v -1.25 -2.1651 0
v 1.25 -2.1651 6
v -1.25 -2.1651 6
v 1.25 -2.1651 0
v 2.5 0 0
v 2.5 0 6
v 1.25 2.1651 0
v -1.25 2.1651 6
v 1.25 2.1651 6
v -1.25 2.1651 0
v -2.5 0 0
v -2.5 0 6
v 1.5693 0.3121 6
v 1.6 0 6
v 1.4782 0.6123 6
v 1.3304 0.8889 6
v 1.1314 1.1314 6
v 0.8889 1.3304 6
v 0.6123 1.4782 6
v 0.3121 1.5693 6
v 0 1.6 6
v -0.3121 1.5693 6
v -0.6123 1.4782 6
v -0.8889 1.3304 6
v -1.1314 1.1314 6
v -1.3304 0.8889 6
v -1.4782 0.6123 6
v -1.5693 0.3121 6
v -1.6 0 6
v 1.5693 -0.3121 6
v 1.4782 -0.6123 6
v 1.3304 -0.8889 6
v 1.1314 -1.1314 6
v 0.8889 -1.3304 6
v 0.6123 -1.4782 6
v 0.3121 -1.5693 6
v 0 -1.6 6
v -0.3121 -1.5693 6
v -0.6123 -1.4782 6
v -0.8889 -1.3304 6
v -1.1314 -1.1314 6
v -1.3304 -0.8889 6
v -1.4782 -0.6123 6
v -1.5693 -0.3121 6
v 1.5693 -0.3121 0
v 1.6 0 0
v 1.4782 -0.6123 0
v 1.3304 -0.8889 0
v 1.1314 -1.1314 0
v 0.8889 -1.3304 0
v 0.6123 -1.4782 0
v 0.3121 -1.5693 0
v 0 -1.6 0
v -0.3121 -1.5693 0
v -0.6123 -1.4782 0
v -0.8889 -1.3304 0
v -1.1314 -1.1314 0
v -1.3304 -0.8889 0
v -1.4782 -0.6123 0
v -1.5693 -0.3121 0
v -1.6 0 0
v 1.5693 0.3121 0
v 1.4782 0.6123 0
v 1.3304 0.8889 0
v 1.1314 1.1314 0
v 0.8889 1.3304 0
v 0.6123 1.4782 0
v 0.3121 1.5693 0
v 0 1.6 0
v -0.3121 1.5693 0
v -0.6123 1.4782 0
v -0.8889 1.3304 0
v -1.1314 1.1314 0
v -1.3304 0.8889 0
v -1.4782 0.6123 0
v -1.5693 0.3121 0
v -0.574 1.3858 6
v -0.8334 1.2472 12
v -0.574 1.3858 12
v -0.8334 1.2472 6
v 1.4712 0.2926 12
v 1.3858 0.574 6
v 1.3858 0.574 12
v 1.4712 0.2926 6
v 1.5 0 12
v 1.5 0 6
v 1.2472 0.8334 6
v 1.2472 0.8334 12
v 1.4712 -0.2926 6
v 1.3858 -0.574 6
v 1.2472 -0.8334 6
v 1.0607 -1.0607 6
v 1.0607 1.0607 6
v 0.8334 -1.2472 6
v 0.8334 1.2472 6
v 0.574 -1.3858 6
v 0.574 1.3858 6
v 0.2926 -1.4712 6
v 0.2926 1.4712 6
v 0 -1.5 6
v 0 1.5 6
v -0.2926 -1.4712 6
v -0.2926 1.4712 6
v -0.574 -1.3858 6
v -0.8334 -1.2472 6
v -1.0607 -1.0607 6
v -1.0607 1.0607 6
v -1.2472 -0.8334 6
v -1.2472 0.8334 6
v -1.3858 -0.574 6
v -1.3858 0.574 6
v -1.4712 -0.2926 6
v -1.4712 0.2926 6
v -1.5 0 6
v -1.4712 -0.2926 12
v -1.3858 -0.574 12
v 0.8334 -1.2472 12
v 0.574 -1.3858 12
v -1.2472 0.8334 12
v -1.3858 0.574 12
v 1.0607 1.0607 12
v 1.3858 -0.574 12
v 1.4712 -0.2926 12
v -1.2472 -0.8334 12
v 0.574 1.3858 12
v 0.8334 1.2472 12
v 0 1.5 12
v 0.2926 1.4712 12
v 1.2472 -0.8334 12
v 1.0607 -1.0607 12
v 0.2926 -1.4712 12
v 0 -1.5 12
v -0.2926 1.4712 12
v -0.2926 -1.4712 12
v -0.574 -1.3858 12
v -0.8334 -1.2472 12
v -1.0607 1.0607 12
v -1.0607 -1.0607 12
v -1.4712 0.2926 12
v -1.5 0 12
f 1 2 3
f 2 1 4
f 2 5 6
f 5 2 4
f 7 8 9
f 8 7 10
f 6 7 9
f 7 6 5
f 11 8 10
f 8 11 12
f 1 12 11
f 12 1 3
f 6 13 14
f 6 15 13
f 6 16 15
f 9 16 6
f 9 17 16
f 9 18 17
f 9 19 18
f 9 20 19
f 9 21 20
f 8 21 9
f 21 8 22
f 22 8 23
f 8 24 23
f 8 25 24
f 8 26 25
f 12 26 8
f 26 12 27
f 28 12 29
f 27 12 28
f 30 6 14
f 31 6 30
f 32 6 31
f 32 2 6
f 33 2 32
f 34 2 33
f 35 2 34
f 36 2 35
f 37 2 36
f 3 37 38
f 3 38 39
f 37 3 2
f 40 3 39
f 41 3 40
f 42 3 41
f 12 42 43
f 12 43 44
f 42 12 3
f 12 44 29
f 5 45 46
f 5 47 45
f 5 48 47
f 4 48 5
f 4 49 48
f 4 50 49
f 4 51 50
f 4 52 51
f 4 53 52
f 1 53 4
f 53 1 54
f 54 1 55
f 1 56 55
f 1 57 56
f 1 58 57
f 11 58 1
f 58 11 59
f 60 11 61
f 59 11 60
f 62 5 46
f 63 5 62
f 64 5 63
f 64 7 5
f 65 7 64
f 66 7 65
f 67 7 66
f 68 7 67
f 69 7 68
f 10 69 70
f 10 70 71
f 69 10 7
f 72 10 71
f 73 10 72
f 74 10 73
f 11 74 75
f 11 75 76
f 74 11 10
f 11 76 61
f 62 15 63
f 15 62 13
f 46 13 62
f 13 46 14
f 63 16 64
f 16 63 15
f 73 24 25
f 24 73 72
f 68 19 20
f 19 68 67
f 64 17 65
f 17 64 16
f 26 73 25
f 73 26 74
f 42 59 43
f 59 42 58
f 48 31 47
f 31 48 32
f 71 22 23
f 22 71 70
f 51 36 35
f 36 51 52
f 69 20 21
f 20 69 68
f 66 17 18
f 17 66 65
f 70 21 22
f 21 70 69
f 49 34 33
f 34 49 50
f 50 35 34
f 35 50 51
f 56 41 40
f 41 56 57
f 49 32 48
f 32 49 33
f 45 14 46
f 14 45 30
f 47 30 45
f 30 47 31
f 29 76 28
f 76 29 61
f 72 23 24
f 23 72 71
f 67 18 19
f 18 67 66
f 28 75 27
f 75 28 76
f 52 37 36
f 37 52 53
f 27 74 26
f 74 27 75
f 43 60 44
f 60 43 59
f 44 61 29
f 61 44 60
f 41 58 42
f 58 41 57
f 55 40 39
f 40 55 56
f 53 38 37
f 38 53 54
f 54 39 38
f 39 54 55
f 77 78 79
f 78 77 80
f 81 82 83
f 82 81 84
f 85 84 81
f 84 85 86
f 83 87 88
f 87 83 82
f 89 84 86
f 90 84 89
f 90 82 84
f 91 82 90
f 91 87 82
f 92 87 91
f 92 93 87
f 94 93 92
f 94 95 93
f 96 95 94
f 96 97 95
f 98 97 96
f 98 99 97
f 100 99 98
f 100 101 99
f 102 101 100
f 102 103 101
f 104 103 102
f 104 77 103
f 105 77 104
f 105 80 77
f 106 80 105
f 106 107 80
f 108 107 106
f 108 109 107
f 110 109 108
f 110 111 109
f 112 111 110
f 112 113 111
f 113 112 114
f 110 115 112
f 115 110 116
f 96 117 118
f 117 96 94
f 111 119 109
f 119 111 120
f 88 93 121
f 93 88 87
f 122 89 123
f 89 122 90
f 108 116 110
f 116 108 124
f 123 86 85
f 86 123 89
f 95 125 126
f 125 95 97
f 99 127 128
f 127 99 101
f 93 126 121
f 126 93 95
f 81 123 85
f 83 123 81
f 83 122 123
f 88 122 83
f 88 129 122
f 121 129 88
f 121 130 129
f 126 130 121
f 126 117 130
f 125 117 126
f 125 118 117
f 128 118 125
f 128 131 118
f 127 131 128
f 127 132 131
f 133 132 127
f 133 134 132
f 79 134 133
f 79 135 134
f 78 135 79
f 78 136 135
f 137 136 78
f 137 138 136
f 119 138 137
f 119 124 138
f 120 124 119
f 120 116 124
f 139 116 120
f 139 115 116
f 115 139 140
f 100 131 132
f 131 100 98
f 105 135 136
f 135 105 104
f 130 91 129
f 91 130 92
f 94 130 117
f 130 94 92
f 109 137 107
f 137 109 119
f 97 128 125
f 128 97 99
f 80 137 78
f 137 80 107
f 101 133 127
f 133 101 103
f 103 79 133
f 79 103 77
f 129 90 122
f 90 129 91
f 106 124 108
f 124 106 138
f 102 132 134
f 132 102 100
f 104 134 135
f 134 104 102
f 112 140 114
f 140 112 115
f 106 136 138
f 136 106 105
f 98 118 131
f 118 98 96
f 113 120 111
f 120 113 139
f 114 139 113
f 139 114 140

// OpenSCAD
// file: ../dimensions.scad
// Shared dimensions for all case components
// This file defines common parameters used across multiple case parts

// --- Wall and Material ---
wall_thickness = 3;

// --- Motherboard (Mini-ITX) ---
mobo_width = 170;
mobo_depth = 170;
mobo_pcb_thickness = 1.6;

// --- Standoffs ---
standoff_height = 6;  // Female thread portion of M3x10+6mm male-female standoff
standoff_hole_radius = 1.6;  // M3 clearance (deprecated - see integrated bottom panel design)
standoff_locations = [
    [12.7, 12.7],
    [165.1, 12.7],
    [12.7, 165.1],
    [165.1, 165.1]
];

// --- Standoff Hexagonal Receptacles (Integrated Bottom Panel Design) ---
standoff_boss_height = 2.5;              // Height of hex boss above panel interior surface
standoff_hex_size_flat_to_flat = 5.5;   // Hex size for M3 screw head (flat-to-flat)
standoff_hex_size_point_to_point = 6.35; // Hex size point-to-point (calculated from F-F)
standoff_pocket_depth = 2.2;             // Depth of hex recess for screw head
standoff_boss_diameter = 6.85;           // Overall boss diameter (hex point + FDM tolerance)
standoff_mounting_screw_length = 8;      // M3 x 8mm cap screw (recommended)
standoff_screw_clearance_hole = 3.3;     // M3 clearance hole + FDM tolerance

// --- I/O Shield ---
// Standard ATX I/O shield dimensions
io_shield_width = 158.75;   // 6.25 inches (standard ATX)
io_shield_height = 44.45;   // 1.75 inches (standard ATX)
io_shield_x_offset = (mobo_width - io_shield_width) / 2;
io_shield_z_offset = 5;     // 5mm from bottom of plate

// --- Backplate ---
backplate_height = 88.9;    // 3.5 inches
backplate_thickness = wall_thickness;

// --- CPU Cooler (Noctua NH-L12S) - Minimal/NAS configurations ---
cooler_width = 128;
cooler_depth = 146;
cooler_base_height = 35;      // Base plate and heatpipes
cooler_fan_height = 15;       // 120mm x 15mm fan (NF-A12x15)
cooler_fins_height = 20;      // Heatsink fins on top
cooler_total_height = cooler_base_height + cooler_fan_height + cooler_fins_height;  // 70mm

// --- CPU Cooler (Noctua NH-L9) - Pico configuration ---
cooler_nh_l9_width = 95;
cooler_nh_l9_depth = 95;
cooler_nh_l9_base_height = 5;       // CPU contact base
cooler_nh_l9_heatsink_height = 18;  // Aluminum fins
cooler_nh_l9_fan_height = 14;       // 92mm x 14mm fan
cooler_nh_l9_total_height = cooler_nh_l9_base_height + cooler_nh_l9_heatsink_height + cooler_nh_l9_fan_height;  // 37mm

// --- Power Supplies ---
// Flex ATX (from technical drawing)
// Standing orientation: 40mm wide (X), 150mm deep (Y), 80mm tall (Z)
flex_atx_width = 40.0;      // A: Width (X - thin side, standing)
flex_atx_length = 150.0;    // B: Length (Y - depth)
flex_atx_height = 80.0;     // G: Height (Z - tall side, standing)

// Flex ATX Mounting holes - 8-32 UNC thread (4 places on rear 40x80mm face)
flex_atx_mount_hole_radius = 2.1;   // 8-32 clearance (~4.2mm dia)
flex_atx_mount_x_inset = 5;         // Distance from left/right edges (corrected from 12.5)
flex_atx_mount_z_inset = 5;         // Distance from top/bottom edges (corrected from 8.25)

// Calculated mounting hole positions (X, Z pairs relative to PSU origin)
// Note: Only 3 holes - top-right (coords) removed where C14 inlet is located
// When viewing from back: top-right (coords) = top-left (view)
flex_atx_mount_holes = [
    [flex_atx_mount_x_inset, flex_atx_mount_z_inset],                                    // Bottom-left (coords) = Bottom-right (view)
    [flex_atx_width - flex_atx_mount_x_inset, flex_atx_mount_z_inset],                   // Bottom-right (coords) = Bottom-left (view)
    [flex_atx_mount_x_inset, flex_atx_height - flex_atx_mount_z_inset]                   // Top-left (coords) = Top-right (view)
    // Top-right (coords) removed - C14 power inlet is here = Top-left (view)
];

// SFX
sfx_length = 125;
sfx_width = 100;
sfx_height = 63.5;

// --- HDD 3.5" Dimensions ---
hdd_width = 101.6;
hdd_length = 147;
hdd_height = 26.1;

// --- NAS 2-Disk Config ---
// 2 HDDs side-by-side (controlling dimension for case width)
// See SPEC.md Section 3.3 for design rationale
nas_2disk_rail_width = 2;
nas_2disk_gap = 5;           // Gap between bays
nas_2disk_padding = 2;       // Clearance around HDDs
nas_2disk_bay_width = hdd_width + 2 * nas_2disk_rail_width;  // ~105.6mm per bay
nas_2disk_inner_width = 2 * nas_2disk_bay_width + nas_2disk_gap;  // ~216.2mm
nas_2disk_width = nas_2disk_inner_width + 2 * (wall_thickness + nas_2disk_padding);  // ~226mm

// --- PSU Compartment ---
// Flex ATX PSU in standing orientation (40mm width)
flex_atx_standing_width = flex_atx_width;  // 40mm (already in standing orientation)
psu_compartment_width = nas_2disk_width - mobo_width;  // ~56mm (40mm PSU + 16mm clearance)

// --- Interior Chamber Height (standoffs + motherboard + cooler) ---
interior_chamber_height = standoff_height + mobo_pcb_thickness + cooler_total_height;  // ~94mm

// --- Minimal Config External Dimensions ---
// Motherboard area only (without PSU)
minimal_mobo_exterior_width = mobo_width + 2 * wall_thickness;   // 176mm
minimal_mobo_exterior_depth = mobo_depth + 2 * wall_thickness;   // 176mm
minimal_exterior_height = interior_chamber_height + 2 * wall_thickness;   // ~100mm

// With Flex ATX PSU next to motherboard
// Width controlled by NAS 2-disk HDD layout (see SPEC.md Section 3.3)
minimal_with_psu_width = nas_2disk_width;  // ~226mm (PSU compartment = 56mm, PSU on side = 40mm)

// --- Interior Panel Dimensions (top/bottom panels fit between walls) ---
interior_panel_width = minimal_with_psu_width - 2 * wall_thickness;  // ~220mm
interior_panel_depth = mobo_depth;                                    // 170mm

// --- Side Panel Dimensions (left/right panels form exterior walls) ---
side_panel_height = minimal_exterior_height;                          // ~100mm
side_panel_depth = mobo_depth + 2 * wall_thickness;                   // 176mm

// --- Front/Back Panel Dimensions (fit between side walls, full exterior height) ---
front_back_panel_width = interior_panel_width;                        // ~220mm
front_back_panel_height = side_panel_height;                          // ~100mm (full exterior)

// --- Ventilation ---
honeycomb_radius = 3;
vent_padding = 5;

// --- Screw Holes for Panel Assembly ---
panel_screw_radius = 1.6;  // M3
panel_screw_inset = 8;     // Distance from edge

// --- GPU ---
gpu_length = 320;          // Max GPU length
gpu_height = 140;          // GPU PCB + cooler height
gpu_width = 60;            // 3 slots

// --- GPU Config External Dimensions ---
// From SPEC.md Section 8.4
gpu_config_width = 171;    // mm
gpu_config_depth = 378;    // mm
gpu_config_height = 190;   // mm

// --- Fans ---
fan_120_size = 120;
fan_120_thickness = 25;
fan_140_size = 140;
fan_140_thickness = 25;

// --- AIO Radiator ---
radiator_240_length = 275;
radiator_240_width = 120;
radiator_240_thickness = 27;

// --- NAS Many-Disk Config ---
// 5-8 drives mounted vertically (on narrowest side)
nas_many_drive_count = 6;  // Default 6 drives
nas_many_drive_spacing = 5;
nas_many_enclosure_height = hdd_width + wall_thickness + 5;  // ~110mm (drives on side)

// --- Power Inlet C14 ---
c14_width = 50;
c14_height = 27;
c14_depth = 30;

// --- Open Air Frame ---
// Frame cylinder height (from motherboard surface to inside panel face)
// Derived: interior_chamber_height - standoff_height - mobo_pcb_thickness
frame_cylinder_height = interior_chamber_height - standoff_height - mobo_pcb_thickness;  // ~86mm
frame_cylinder_outer_diameter = 8;     // Outer diameter
frame_cylinder_inner_diameter = 3.2;   // M3 clearance for standoff stud
frame_cylinder_thread_depth = 6;       // Matches extended_standoff_male_height (M3x6+6mm)
// main file
// Extended Standoff - M3x6+6mm Male-Female
// Used for Open Air Frame mounting system
// 6mm female thread below (accepts motherboard mounting screw)
// 6mm male stud above (frame cylinders screw onto this)

include <../dimensions.scad>

// --- Extended Standoff Dimensions ---
extended_standoff_female_height = 6;      // Female portion height (below mobo)
extended_standoff_male_height = 6;        // Male stud height (above mobo)
extended_standoff_outer_diameter = 5;     // Outer diameter of standoff body
extended_standoff_thread_diameter = 3;    // M3 thread diameter
extended_standoff_thread_clearance = 3.2; // M3 clearance hole

// Brass color
brass_color = [0.71, 0.65, 0.26];

// --- Module: Extended Standoff ---
// Creates a single M3x10+6mm male-female standoff
module extended_standoff() {
    color(brass_color) {
        // Female portion (below motherboard)
        difference() {
            cylinder(h=extended_standoff_female_height, d=extended_standoff_outer_diameter, $fn=6);
            // Female thread hole (for screw from below)
            translate([0, 0, -0.1])
                cylinder(h=extended_standoff_female_height + 0.2, d=extended_standoff_thread_clearance, $fn=32);
        }

        // Male stud (above motherboard)
        translate([0, 0, extended_standoff_female_height])
            cylinder(h=extended_standoff_male_height, d=extended_standoff_thread_diameter, $fn=32);
    }
}

// --- Module: Extended Standoffs at Mini-ITX locations ---
// Places extended standoffs at all 4 Mini-ITX mounting positions
module extended_standoffs() {
    for (pos = standoff_locations) {
        translate([pos[0], pos[1], 0])
            extended_standoff();
    }
}

// Preview
extended_standoff();
